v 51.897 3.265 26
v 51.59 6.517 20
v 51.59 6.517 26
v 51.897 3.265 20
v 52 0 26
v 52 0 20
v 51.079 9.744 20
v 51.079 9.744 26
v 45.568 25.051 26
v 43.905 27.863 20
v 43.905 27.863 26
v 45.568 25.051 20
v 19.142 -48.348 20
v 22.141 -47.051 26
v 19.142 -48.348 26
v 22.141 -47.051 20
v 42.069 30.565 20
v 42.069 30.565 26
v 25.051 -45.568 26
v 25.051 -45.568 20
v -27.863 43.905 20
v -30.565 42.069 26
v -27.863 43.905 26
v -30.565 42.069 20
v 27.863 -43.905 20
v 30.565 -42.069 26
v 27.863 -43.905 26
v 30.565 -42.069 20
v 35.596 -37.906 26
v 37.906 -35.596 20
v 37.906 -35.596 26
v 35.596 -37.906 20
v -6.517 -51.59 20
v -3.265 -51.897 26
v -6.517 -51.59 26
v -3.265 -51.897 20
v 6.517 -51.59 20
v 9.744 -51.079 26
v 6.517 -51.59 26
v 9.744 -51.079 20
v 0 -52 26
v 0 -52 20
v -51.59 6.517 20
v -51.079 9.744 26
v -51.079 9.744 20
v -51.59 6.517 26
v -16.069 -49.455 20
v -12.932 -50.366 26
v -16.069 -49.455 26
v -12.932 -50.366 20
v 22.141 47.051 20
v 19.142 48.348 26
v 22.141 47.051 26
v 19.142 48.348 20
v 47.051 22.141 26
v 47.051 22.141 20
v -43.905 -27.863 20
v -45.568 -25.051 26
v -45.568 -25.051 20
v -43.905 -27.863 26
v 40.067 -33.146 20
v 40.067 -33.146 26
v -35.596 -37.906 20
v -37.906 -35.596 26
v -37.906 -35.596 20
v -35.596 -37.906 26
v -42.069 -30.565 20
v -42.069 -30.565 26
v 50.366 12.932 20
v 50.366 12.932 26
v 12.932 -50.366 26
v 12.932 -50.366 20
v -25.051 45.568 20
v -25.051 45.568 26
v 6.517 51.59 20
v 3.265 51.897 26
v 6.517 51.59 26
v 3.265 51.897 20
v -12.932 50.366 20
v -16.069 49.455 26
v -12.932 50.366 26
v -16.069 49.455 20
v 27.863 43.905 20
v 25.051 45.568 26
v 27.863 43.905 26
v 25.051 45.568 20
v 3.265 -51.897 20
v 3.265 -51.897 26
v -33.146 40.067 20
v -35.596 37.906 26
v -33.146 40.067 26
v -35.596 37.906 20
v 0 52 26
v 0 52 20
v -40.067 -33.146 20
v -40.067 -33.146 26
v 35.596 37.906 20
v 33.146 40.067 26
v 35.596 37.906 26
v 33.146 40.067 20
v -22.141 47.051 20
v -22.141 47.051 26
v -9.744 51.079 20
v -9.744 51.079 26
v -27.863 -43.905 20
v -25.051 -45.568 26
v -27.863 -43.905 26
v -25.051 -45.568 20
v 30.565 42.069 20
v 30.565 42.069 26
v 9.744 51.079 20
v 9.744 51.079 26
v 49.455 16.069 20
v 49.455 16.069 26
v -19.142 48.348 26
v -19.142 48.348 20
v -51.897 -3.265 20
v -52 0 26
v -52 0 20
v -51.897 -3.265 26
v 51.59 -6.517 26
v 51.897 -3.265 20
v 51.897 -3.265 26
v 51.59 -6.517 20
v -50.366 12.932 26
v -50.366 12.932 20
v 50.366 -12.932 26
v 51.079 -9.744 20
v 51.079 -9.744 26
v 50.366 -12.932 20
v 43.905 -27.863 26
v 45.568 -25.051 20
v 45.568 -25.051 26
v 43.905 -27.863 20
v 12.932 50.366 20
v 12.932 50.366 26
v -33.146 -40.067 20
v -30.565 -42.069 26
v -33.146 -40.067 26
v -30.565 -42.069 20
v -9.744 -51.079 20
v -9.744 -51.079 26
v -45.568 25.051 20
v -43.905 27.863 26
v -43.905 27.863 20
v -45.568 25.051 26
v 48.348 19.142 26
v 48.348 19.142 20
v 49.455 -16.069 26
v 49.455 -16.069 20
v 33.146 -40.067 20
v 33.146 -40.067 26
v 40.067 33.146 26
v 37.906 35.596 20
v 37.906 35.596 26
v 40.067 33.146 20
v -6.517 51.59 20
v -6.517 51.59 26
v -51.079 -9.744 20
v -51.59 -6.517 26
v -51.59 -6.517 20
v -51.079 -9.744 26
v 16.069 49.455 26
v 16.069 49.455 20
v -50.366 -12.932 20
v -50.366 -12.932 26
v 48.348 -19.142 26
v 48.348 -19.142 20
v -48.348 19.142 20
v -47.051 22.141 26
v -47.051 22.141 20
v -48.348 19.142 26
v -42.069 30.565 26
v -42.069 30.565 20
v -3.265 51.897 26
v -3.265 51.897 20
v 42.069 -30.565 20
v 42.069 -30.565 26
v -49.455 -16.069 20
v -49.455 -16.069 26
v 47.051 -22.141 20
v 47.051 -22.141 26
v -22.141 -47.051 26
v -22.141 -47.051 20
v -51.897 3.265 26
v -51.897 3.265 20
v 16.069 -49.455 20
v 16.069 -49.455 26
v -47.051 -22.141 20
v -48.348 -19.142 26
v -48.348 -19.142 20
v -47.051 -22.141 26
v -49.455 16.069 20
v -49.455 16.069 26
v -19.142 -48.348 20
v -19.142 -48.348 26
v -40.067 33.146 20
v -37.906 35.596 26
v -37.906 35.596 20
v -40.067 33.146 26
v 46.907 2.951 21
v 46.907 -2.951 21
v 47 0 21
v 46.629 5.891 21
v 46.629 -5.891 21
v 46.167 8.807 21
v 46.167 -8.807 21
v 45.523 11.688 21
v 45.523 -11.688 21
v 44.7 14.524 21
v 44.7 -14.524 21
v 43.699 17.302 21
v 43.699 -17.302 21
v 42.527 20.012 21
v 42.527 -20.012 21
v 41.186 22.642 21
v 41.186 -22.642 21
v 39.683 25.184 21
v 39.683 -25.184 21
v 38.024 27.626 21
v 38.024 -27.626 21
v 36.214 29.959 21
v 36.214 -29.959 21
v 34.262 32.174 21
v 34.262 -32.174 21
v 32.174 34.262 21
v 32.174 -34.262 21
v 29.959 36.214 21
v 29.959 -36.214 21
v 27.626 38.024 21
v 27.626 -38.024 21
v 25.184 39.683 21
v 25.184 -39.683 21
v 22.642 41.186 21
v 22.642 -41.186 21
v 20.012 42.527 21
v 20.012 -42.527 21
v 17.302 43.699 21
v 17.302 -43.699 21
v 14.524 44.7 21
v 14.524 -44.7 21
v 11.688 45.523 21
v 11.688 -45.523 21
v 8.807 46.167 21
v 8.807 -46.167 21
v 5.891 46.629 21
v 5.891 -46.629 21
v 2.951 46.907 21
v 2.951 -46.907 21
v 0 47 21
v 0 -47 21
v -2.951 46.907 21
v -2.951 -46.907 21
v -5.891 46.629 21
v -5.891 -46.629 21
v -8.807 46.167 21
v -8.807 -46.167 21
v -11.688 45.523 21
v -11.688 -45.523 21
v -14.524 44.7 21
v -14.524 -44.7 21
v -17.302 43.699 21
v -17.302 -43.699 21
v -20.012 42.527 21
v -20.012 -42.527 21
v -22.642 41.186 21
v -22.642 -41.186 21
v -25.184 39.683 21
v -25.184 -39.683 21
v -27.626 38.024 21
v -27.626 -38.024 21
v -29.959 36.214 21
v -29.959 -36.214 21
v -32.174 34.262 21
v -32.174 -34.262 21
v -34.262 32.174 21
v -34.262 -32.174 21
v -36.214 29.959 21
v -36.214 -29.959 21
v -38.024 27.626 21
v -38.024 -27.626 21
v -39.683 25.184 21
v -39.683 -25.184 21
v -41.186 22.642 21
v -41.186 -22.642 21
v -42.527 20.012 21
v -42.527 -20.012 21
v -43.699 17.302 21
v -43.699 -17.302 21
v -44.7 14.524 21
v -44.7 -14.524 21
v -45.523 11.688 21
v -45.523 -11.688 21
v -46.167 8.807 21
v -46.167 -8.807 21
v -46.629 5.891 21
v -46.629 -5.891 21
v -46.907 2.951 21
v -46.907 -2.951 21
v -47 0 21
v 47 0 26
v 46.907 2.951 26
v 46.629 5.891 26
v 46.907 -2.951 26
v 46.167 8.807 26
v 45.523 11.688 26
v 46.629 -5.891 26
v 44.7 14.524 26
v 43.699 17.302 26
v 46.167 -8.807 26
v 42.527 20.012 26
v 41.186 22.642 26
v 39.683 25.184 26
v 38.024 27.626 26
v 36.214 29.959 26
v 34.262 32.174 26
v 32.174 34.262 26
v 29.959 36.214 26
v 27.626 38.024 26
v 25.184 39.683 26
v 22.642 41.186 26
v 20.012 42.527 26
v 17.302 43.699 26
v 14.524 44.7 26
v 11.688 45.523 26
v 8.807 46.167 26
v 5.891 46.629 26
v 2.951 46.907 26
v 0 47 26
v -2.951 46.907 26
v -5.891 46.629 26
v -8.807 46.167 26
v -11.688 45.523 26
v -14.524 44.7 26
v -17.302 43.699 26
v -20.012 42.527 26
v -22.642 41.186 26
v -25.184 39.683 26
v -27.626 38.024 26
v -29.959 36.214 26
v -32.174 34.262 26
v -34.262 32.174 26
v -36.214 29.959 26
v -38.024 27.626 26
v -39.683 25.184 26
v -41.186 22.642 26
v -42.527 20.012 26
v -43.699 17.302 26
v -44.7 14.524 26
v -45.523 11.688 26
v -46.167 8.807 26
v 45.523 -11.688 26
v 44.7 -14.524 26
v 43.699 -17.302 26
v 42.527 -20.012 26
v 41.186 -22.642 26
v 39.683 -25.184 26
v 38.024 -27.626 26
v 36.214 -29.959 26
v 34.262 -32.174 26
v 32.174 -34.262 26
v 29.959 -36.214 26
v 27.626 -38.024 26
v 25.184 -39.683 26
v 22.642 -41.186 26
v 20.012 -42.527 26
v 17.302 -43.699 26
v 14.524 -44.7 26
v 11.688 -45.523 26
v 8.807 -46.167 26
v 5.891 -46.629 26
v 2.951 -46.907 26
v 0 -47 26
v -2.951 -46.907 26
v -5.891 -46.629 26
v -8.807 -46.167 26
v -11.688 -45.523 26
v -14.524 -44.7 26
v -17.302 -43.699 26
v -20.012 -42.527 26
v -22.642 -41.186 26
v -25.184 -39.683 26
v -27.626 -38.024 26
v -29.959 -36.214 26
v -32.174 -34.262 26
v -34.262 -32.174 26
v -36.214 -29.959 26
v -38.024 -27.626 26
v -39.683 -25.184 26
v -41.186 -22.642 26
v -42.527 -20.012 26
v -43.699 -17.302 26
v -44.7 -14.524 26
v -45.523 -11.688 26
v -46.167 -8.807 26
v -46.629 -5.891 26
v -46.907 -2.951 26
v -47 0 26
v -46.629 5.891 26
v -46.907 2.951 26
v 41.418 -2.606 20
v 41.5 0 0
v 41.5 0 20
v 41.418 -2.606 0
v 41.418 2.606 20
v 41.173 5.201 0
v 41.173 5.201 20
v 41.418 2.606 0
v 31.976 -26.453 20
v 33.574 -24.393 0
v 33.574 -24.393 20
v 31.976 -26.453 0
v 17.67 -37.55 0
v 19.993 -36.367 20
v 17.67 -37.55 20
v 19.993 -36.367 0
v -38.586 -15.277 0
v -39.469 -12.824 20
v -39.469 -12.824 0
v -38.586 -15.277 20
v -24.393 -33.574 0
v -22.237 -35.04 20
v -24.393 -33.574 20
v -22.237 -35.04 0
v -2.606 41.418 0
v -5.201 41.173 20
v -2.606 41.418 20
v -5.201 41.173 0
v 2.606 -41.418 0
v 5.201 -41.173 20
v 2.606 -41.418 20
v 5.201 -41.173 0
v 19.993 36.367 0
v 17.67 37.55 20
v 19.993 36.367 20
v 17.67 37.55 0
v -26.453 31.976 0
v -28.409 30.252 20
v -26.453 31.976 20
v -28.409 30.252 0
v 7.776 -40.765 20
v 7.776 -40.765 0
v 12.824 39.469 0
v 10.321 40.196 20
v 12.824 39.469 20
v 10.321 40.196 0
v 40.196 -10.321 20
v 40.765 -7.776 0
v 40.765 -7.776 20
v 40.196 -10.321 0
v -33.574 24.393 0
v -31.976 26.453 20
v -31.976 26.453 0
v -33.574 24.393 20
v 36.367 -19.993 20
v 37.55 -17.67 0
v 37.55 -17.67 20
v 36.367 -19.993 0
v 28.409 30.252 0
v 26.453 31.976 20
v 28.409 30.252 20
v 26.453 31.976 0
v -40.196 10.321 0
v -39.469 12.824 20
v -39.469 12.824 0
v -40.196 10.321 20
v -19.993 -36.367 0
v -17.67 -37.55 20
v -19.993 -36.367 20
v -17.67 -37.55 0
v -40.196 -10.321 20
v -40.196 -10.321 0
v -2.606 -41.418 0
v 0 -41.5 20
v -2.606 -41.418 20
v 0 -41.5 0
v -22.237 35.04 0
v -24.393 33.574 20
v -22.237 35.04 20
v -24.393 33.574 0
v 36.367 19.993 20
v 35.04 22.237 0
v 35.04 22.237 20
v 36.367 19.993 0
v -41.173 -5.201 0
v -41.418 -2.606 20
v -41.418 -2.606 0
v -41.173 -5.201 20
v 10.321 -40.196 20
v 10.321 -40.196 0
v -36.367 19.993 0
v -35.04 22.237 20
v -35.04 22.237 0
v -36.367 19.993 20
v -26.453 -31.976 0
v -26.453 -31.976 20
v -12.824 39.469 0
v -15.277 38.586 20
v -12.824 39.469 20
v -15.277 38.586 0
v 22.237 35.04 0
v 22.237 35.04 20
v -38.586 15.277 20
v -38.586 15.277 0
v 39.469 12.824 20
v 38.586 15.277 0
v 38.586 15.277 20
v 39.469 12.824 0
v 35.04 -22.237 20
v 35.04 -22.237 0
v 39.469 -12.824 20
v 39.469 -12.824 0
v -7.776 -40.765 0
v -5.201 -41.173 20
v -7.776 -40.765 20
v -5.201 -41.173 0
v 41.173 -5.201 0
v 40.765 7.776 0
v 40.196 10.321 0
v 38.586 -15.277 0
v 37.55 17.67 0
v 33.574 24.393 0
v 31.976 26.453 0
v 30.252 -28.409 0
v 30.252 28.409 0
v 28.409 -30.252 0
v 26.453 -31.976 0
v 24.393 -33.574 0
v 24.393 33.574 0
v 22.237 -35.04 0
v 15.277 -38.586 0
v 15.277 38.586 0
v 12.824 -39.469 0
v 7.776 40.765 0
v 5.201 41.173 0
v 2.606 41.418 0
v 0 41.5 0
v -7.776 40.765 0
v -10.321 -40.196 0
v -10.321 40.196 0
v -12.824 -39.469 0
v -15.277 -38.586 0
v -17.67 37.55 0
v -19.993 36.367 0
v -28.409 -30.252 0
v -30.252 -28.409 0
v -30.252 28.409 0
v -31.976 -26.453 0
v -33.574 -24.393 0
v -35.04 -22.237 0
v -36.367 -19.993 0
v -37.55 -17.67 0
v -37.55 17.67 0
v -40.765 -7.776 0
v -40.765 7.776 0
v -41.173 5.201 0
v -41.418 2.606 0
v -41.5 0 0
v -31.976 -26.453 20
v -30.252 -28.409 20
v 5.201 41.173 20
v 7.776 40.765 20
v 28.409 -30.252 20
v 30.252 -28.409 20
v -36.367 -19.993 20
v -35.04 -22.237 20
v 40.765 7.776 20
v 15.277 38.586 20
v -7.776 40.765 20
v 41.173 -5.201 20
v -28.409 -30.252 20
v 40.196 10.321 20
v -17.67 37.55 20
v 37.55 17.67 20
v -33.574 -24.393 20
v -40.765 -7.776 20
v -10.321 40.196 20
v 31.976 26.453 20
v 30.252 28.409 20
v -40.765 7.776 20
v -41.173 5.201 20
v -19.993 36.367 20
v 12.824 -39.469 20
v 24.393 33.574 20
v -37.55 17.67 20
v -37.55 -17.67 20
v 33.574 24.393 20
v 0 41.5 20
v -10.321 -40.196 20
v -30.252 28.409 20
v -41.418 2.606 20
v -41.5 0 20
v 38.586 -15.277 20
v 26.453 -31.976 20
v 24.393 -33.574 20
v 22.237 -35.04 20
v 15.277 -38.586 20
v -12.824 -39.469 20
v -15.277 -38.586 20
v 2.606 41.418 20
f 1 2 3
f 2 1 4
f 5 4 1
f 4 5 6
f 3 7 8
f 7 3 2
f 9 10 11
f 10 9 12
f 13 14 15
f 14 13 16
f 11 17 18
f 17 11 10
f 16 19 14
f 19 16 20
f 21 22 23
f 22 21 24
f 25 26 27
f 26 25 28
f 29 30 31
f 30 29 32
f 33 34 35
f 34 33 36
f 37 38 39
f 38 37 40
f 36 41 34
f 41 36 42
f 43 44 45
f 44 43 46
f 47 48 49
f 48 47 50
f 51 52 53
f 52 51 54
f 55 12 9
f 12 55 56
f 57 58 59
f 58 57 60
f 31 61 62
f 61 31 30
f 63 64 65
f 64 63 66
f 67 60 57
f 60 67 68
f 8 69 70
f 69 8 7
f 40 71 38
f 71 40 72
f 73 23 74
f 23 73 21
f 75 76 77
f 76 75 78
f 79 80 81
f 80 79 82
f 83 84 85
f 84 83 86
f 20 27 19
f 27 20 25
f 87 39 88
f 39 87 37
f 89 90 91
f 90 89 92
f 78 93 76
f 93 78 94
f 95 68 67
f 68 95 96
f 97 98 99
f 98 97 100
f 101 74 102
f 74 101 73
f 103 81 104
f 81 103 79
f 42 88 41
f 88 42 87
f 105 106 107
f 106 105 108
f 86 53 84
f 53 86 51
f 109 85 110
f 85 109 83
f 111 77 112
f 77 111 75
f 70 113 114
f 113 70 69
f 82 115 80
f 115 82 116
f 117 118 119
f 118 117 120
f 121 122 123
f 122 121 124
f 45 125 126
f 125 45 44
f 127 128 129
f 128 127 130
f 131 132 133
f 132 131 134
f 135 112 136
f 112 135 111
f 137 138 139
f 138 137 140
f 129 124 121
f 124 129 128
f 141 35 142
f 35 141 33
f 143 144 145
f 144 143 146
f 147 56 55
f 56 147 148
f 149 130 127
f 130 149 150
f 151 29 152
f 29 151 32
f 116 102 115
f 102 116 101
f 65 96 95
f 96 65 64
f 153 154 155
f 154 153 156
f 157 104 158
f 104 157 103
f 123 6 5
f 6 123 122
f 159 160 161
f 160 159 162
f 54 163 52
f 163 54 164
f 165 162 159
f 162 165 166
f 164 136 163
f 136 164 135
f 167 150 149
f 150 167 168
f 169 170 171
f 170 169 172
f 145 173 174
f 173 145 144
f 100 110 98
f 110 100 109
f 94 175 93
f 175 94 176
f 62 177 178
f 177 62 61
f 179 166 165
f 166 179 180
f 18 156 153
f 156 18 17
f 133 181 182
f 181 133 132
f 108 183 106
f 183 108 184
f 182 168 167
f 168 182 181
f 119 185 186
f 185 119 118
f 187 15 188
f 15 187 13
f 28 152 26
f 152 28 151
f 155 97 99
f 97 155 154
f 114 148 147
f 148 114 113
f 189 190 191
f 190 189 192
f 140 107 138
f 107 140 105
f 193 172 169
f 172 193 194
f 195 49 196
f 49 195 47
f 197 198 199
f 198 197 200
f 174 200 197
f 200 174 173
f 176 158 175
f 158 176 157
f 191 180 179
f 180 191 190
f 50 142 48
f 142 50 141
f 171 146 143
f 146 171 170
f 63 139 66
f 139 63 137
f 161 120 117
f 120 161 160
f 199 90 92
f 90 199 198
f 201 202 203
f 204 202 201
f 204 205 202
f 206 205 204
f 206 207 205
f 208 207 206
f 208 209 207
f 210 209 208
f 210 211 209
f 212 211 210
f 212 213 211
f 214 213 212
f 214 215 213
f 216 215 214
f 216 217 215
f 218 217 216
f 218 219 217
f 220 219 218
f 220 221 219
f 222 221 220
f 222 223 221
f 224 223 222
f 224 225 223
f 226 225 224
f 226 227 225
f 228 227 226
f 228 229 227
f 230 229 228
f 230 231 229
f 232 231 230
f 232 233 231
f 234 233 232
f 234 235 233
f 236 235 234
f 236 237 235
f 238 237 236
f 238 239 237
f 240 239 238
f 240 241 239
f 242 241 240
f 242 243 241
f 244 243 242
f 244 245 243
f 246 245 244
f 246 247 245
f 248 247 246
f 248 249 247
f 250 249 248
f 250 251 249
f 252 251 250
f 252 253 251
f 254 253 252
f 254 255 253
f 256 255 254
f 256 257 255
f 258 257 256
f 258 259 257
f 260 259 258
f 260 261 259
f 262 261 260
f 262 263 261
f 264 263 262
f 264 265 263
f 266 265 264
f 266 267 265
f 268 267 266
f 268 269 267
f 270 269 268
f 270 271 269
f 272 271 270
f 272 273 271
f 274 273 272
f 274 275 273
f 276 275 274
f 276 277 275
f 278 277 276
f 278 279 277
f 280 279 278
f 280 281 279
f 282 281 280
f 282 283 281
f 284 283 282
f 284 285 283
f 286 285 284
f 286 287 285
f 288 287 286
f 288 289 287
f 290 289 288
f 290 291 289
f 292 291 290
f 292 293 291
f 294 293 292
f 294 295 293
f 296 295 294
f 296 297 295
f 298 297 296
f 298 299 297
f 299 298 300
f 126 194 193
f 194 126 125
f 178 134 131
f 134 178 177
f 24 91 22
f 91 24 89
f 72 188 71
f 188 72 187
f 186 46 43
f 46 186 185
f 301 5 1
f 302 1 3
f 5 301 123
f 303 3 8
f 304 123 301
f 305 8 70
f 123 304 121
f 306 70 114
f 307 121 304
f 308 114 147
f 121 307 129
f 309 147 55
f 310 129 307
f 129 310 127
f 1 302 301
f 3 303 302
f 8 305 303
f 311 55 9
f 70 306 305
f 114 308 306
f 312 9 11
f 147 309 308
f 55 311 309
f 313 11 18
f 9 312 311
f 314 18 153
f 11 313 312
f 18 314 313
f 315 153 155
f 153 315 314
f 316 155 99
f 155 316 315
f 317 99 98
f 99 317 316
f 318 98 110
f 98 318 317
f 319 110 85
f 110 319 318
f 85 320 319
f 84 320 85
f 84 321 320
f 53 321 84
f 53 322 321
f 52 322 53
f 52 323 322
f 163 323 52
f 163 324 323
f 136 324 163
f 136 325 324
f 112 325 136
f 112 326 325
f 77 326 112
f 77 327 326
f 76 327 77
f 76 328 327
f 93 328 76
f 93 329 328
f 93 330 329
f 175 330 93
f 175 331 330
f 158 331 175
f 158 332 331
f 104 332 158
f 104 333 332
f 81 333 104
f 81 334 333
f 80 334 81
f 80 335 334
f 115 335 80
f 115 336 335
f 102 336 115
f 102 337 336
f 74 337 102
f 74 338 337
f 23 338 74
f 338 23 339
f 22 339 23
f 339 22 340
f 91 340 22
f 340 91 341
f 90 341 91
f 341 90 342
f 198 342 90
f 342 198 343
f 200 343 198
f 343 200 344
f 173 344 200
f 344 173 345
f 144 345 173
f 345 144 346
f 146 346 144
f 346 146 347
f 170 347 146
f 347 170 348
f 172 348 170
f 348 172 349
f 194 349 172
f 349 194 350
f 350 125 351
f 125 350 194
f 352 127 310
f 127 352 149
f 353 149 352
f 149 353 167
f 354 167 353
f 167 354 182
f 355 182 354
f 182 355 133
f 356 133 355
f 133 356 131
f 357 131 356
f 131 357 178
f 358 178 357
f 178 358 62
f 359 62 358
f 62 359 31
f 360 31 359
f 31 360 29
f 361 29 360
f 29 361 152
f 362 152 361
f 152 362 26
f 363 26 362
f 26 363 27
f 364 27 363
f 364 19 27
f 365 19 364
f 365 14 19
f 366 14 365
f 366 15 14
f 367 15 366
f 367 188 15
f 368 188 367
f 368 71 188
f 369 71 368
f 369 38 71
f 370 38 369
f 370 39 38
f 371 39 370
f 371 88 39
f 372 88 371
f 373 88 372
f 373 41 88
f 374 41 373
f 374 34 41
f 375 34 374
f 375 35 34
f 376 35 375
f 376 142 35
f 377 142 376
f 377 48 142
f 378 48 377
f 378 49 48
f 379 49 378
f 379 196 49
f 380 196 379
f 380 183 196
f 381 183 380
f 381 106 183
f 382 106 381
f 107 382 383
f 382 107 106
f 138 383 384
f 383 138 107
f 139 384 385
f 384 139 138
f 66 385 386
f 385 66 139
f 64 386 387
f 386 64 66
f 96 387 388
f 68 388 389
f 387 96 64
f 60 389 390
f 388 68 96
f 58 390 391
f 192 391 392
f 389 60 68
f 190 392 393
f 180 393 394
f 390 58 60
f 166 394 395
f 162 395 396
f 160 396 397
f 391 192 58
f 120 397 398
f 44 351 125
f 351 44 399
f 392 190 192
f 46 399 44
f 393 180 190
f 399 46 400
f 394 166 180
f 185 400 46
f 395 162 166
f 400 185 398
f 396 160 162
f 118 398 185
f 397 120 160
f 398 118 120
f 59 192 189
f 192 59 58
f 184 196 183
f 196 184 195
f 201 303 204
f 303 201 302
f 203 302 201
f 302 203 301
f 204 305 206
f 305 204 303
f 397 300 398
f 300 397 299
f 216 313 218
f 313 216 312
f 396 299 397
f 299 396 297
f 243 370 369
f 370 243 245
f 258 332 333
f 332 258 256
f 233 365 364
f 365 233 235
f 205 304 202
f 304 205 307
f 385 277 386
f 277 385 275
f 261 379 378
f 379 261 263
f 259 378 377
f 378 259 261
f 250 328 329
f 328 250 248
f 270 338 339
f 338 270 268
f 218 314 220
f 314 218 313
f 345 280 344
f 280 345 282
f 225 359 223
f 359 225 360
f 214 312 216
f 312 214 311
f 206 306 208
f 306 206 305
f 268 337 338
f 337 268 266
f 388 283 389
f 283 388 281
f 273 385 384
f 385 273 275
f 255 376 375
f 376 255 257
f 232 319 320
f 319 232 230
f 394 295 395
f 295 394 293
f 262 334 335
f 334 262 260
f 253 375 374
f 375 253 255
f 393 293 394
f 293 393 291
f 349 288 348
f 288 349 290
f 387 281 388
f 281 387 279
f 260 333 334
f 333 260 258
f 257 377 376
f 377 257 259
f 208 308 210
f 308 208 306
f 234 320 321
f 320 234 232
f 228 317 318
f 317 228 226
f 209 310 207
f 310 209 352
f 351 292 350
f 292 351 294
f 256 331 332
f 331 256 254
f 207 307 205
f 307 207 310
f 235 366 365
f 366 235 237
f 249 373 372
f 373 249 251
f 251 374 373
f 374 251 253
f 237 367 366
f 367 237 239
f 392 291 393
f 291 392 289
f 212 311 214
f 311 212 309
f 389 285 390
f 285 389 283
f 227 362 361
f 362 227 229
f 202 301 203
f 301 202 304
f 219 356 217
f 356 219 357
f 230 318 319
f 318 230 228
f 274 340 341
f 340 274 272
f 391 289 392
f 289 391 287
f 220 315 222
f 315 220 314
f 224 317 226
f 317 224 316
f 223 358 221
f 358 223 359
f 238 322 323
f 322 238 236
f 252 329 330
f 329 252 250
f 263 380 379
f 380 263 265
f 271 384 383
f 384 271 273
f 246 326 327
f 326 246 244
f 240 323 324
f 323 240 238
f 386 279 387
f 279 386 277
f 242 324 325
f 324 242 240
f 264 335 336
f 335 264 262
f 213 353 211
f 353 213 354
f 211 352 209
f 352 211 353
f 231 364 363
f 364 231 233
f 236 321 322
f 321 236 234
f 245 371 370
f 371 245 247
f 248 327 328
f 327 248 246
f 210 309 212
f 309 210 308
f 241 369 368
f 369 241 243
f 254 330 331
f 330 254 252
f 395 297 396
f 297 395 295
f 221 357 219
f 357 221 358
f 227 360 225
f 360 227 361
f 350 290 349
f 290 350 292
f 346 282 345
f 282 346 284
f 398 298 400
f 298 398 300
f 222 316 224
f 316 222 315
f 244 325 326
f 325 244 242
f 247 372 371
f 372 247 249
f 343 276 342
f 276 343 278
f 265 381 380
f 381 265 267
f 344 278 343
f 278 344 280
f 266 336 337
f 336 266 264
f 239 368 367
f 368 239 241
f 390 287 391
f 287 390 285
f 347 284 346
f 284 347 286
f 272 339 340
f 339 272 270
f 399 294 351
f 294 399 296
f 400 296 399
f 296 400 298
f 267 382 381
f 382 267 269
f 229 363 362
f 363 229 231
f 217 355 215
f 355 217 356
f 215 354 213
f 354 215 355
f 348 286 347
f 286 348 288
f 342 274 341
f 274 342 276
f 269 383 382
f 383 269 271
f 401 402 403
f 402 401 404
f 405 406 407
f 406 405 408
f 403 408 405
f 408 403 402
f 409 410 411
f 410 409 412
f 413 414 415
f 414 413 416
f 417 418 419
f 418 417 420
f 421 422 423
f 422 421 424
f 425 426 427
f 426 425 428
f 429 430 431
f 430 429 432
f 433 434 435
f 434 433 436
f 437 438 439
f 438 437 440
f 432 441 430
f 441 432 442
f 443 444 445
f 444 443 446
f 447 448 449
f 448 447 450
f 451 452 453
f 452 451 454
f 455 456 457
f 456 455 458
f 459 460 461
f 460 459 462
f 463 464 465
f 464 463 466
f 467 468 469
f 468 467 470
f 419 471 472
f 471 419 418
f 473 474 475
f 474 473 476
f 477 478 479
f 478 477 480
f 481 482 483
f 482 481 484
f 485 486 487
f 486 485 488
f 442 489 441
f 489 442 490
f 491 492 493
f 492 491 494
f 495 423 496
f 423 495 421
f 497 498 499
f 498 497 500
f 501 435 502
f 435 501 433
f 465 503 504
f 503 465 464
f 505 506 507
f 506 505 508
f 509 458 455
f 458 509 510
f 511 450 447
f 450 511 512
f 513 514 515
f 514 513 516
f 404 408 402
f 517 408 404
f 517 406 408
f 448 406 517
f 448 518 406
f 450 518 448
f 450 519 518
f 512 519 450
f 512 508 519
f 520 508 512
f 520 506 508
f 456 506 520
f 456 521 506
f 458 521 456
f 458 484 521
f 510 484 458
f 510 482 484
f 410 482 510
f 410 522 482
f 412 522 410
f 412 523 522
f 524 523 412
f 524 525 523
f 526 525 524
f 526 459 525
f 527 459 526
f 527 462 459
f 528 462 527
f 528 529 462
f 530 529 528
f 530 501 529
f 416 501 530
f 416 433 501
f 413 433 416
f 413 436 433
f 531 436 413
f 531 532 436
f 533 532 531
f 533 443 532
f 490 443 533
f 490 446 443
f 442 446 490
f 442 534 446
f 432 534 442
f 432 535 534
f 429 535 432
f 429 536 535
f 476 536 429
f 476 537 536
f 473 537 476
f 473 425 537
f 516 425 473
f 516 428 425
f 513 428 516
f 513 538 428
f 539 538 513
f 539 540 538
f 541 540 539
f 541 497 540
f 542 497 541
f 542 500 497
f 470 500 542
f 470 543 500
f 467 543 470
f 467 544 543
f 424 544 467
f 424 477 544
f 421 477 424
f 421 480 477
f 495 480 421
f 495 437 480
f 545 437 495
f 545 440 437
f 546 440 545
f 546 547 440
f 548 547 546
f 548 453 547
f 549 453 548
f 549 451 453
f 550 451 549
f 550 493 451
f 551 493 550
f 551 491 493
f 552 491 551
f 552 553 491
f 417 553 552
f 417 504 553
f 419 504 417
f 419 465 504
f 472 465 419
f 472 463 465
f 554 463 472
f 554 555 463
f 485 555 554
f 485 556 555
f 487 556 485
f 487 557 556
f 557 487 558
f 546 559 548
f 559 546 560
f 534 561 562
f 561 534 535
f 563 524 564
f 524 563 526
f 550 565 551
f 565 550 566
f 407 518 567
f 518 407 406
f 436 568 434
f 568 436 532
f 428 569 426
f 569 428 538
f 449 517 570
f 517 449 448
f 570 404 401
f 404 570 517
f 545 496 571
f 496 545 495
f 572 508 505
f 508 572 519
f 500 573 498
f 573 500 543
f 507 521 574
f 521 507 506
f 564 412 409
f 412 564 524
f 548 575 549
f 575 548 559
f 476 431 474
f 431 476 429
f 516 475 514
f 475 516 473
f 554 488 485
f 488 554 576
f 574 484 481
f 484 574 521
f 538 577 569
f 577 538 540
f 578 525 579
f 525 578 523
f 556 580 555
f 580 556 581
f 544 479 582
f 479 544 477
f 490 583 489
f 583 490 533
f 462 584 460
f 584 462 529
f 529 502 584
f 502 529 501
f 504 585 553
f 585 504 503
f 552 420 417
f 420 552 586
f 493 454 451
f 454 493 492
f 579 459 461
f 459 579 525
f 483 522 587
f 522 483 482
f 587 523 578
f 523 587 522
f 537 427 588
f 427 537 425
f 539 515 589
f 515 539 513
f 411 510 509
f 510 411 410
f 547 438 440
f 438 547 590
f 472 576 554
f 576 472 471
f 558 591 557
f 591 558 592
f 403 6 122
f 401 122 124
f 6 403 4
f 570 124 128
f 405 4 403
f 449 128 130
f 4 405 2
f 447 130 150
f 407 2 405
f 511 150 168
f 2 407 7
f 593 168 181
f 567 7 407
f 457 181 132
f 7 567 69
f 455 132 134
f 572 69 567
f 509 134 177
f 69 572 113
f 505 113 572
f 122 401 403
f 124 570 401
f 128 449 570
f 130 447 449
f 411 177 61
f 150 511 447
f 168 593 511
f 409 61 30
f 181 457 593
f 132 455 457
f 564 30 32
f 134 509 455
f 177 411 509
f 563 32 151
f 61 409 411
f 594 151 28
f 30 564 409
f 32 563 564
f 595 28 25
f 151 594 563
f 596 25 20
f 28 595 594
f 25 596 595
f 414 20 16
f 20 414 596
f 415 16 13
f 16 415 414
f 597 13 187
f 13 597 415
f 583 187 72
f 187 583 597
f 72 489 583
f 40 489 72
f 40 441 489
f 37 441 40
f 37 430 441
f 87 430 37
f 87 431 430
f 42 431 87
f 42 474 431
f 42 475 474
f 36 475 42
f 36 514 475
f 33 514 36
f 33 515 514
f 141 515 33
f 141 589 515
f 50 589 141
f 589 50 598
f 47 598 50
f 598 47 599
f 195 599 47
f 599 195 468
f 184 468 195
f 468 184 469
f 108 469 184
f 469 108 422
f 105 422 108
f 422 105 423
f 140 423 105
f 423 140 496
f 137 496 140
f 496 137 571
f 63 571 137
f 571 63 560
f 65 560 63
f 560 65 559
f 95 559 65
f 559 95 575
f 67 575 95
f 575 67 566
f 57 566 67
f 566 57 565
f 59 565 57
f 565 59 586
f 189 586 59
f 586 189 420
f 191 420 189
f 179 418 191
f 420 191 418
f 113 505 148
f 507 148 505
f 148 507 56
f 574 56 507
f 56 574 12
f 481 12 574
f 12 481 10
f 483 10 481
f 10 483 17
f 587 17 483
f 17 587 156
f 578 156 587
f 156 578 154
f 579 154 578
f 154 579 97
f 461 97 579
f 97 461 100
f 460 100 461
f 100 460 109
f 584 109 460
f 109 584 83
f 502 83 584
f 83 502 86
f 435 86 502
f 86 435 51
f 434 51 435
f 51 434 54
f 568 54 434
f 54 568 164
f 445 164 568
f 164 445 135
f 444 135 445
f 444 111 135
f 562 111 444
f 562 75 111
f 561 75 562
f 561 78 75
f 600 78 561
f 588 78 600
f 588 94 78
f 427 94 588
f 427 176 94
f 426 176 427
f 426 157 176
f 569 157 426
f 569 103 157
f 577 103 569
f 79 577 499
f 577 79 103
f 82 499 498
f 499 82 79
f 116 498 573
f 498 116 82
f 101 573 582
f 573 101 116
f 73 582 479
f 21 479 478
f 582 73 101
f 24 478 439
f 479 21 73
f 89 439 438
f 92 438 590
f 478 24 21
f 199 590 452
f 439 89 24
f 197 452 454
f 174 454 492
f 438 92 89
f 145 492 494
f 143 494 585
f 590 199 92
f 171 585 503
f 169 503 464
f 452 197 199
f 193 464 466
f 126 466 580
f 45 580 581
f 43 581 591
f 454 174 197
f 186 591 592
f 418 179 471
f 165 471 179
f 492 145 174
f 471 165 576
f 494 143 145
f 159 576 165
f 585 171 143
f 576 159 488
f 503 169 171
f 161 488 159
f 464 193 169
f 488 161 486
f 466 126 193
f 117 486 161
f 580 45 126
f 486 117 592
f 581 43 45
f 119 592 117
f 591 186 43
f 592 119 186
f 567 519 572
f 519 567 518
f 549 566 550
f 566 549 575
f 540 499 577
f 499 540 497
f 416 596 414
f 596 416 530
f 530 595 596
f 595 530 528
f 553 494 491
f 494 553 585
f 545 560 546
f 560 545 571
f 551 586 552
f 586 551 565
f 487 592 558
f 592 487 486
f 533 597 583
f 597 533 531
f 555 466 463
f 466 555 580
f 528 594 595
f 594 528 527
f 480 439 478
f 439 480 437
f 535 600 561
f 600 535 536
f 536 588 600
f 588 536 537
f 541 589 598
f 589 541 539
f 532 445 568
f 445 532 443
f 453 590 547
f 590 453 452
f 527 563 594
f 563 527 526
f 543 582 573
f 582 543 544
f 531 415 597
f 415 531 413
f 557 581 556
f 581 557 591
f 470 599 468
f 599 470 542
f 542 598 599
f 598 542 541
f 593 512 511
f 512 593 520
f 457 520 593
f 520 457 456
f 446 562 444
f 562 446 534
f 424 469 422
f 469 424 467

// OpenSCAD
$fn=100;
    cylinder(r=41.5, h= 20);

translate([0,0,20]) 
cylinder(r=52,h=1);
translate([0,0,21]) 
difference() {
    cylinder(r=52,h=5);
    cylinder(r=47,h=5);
}
